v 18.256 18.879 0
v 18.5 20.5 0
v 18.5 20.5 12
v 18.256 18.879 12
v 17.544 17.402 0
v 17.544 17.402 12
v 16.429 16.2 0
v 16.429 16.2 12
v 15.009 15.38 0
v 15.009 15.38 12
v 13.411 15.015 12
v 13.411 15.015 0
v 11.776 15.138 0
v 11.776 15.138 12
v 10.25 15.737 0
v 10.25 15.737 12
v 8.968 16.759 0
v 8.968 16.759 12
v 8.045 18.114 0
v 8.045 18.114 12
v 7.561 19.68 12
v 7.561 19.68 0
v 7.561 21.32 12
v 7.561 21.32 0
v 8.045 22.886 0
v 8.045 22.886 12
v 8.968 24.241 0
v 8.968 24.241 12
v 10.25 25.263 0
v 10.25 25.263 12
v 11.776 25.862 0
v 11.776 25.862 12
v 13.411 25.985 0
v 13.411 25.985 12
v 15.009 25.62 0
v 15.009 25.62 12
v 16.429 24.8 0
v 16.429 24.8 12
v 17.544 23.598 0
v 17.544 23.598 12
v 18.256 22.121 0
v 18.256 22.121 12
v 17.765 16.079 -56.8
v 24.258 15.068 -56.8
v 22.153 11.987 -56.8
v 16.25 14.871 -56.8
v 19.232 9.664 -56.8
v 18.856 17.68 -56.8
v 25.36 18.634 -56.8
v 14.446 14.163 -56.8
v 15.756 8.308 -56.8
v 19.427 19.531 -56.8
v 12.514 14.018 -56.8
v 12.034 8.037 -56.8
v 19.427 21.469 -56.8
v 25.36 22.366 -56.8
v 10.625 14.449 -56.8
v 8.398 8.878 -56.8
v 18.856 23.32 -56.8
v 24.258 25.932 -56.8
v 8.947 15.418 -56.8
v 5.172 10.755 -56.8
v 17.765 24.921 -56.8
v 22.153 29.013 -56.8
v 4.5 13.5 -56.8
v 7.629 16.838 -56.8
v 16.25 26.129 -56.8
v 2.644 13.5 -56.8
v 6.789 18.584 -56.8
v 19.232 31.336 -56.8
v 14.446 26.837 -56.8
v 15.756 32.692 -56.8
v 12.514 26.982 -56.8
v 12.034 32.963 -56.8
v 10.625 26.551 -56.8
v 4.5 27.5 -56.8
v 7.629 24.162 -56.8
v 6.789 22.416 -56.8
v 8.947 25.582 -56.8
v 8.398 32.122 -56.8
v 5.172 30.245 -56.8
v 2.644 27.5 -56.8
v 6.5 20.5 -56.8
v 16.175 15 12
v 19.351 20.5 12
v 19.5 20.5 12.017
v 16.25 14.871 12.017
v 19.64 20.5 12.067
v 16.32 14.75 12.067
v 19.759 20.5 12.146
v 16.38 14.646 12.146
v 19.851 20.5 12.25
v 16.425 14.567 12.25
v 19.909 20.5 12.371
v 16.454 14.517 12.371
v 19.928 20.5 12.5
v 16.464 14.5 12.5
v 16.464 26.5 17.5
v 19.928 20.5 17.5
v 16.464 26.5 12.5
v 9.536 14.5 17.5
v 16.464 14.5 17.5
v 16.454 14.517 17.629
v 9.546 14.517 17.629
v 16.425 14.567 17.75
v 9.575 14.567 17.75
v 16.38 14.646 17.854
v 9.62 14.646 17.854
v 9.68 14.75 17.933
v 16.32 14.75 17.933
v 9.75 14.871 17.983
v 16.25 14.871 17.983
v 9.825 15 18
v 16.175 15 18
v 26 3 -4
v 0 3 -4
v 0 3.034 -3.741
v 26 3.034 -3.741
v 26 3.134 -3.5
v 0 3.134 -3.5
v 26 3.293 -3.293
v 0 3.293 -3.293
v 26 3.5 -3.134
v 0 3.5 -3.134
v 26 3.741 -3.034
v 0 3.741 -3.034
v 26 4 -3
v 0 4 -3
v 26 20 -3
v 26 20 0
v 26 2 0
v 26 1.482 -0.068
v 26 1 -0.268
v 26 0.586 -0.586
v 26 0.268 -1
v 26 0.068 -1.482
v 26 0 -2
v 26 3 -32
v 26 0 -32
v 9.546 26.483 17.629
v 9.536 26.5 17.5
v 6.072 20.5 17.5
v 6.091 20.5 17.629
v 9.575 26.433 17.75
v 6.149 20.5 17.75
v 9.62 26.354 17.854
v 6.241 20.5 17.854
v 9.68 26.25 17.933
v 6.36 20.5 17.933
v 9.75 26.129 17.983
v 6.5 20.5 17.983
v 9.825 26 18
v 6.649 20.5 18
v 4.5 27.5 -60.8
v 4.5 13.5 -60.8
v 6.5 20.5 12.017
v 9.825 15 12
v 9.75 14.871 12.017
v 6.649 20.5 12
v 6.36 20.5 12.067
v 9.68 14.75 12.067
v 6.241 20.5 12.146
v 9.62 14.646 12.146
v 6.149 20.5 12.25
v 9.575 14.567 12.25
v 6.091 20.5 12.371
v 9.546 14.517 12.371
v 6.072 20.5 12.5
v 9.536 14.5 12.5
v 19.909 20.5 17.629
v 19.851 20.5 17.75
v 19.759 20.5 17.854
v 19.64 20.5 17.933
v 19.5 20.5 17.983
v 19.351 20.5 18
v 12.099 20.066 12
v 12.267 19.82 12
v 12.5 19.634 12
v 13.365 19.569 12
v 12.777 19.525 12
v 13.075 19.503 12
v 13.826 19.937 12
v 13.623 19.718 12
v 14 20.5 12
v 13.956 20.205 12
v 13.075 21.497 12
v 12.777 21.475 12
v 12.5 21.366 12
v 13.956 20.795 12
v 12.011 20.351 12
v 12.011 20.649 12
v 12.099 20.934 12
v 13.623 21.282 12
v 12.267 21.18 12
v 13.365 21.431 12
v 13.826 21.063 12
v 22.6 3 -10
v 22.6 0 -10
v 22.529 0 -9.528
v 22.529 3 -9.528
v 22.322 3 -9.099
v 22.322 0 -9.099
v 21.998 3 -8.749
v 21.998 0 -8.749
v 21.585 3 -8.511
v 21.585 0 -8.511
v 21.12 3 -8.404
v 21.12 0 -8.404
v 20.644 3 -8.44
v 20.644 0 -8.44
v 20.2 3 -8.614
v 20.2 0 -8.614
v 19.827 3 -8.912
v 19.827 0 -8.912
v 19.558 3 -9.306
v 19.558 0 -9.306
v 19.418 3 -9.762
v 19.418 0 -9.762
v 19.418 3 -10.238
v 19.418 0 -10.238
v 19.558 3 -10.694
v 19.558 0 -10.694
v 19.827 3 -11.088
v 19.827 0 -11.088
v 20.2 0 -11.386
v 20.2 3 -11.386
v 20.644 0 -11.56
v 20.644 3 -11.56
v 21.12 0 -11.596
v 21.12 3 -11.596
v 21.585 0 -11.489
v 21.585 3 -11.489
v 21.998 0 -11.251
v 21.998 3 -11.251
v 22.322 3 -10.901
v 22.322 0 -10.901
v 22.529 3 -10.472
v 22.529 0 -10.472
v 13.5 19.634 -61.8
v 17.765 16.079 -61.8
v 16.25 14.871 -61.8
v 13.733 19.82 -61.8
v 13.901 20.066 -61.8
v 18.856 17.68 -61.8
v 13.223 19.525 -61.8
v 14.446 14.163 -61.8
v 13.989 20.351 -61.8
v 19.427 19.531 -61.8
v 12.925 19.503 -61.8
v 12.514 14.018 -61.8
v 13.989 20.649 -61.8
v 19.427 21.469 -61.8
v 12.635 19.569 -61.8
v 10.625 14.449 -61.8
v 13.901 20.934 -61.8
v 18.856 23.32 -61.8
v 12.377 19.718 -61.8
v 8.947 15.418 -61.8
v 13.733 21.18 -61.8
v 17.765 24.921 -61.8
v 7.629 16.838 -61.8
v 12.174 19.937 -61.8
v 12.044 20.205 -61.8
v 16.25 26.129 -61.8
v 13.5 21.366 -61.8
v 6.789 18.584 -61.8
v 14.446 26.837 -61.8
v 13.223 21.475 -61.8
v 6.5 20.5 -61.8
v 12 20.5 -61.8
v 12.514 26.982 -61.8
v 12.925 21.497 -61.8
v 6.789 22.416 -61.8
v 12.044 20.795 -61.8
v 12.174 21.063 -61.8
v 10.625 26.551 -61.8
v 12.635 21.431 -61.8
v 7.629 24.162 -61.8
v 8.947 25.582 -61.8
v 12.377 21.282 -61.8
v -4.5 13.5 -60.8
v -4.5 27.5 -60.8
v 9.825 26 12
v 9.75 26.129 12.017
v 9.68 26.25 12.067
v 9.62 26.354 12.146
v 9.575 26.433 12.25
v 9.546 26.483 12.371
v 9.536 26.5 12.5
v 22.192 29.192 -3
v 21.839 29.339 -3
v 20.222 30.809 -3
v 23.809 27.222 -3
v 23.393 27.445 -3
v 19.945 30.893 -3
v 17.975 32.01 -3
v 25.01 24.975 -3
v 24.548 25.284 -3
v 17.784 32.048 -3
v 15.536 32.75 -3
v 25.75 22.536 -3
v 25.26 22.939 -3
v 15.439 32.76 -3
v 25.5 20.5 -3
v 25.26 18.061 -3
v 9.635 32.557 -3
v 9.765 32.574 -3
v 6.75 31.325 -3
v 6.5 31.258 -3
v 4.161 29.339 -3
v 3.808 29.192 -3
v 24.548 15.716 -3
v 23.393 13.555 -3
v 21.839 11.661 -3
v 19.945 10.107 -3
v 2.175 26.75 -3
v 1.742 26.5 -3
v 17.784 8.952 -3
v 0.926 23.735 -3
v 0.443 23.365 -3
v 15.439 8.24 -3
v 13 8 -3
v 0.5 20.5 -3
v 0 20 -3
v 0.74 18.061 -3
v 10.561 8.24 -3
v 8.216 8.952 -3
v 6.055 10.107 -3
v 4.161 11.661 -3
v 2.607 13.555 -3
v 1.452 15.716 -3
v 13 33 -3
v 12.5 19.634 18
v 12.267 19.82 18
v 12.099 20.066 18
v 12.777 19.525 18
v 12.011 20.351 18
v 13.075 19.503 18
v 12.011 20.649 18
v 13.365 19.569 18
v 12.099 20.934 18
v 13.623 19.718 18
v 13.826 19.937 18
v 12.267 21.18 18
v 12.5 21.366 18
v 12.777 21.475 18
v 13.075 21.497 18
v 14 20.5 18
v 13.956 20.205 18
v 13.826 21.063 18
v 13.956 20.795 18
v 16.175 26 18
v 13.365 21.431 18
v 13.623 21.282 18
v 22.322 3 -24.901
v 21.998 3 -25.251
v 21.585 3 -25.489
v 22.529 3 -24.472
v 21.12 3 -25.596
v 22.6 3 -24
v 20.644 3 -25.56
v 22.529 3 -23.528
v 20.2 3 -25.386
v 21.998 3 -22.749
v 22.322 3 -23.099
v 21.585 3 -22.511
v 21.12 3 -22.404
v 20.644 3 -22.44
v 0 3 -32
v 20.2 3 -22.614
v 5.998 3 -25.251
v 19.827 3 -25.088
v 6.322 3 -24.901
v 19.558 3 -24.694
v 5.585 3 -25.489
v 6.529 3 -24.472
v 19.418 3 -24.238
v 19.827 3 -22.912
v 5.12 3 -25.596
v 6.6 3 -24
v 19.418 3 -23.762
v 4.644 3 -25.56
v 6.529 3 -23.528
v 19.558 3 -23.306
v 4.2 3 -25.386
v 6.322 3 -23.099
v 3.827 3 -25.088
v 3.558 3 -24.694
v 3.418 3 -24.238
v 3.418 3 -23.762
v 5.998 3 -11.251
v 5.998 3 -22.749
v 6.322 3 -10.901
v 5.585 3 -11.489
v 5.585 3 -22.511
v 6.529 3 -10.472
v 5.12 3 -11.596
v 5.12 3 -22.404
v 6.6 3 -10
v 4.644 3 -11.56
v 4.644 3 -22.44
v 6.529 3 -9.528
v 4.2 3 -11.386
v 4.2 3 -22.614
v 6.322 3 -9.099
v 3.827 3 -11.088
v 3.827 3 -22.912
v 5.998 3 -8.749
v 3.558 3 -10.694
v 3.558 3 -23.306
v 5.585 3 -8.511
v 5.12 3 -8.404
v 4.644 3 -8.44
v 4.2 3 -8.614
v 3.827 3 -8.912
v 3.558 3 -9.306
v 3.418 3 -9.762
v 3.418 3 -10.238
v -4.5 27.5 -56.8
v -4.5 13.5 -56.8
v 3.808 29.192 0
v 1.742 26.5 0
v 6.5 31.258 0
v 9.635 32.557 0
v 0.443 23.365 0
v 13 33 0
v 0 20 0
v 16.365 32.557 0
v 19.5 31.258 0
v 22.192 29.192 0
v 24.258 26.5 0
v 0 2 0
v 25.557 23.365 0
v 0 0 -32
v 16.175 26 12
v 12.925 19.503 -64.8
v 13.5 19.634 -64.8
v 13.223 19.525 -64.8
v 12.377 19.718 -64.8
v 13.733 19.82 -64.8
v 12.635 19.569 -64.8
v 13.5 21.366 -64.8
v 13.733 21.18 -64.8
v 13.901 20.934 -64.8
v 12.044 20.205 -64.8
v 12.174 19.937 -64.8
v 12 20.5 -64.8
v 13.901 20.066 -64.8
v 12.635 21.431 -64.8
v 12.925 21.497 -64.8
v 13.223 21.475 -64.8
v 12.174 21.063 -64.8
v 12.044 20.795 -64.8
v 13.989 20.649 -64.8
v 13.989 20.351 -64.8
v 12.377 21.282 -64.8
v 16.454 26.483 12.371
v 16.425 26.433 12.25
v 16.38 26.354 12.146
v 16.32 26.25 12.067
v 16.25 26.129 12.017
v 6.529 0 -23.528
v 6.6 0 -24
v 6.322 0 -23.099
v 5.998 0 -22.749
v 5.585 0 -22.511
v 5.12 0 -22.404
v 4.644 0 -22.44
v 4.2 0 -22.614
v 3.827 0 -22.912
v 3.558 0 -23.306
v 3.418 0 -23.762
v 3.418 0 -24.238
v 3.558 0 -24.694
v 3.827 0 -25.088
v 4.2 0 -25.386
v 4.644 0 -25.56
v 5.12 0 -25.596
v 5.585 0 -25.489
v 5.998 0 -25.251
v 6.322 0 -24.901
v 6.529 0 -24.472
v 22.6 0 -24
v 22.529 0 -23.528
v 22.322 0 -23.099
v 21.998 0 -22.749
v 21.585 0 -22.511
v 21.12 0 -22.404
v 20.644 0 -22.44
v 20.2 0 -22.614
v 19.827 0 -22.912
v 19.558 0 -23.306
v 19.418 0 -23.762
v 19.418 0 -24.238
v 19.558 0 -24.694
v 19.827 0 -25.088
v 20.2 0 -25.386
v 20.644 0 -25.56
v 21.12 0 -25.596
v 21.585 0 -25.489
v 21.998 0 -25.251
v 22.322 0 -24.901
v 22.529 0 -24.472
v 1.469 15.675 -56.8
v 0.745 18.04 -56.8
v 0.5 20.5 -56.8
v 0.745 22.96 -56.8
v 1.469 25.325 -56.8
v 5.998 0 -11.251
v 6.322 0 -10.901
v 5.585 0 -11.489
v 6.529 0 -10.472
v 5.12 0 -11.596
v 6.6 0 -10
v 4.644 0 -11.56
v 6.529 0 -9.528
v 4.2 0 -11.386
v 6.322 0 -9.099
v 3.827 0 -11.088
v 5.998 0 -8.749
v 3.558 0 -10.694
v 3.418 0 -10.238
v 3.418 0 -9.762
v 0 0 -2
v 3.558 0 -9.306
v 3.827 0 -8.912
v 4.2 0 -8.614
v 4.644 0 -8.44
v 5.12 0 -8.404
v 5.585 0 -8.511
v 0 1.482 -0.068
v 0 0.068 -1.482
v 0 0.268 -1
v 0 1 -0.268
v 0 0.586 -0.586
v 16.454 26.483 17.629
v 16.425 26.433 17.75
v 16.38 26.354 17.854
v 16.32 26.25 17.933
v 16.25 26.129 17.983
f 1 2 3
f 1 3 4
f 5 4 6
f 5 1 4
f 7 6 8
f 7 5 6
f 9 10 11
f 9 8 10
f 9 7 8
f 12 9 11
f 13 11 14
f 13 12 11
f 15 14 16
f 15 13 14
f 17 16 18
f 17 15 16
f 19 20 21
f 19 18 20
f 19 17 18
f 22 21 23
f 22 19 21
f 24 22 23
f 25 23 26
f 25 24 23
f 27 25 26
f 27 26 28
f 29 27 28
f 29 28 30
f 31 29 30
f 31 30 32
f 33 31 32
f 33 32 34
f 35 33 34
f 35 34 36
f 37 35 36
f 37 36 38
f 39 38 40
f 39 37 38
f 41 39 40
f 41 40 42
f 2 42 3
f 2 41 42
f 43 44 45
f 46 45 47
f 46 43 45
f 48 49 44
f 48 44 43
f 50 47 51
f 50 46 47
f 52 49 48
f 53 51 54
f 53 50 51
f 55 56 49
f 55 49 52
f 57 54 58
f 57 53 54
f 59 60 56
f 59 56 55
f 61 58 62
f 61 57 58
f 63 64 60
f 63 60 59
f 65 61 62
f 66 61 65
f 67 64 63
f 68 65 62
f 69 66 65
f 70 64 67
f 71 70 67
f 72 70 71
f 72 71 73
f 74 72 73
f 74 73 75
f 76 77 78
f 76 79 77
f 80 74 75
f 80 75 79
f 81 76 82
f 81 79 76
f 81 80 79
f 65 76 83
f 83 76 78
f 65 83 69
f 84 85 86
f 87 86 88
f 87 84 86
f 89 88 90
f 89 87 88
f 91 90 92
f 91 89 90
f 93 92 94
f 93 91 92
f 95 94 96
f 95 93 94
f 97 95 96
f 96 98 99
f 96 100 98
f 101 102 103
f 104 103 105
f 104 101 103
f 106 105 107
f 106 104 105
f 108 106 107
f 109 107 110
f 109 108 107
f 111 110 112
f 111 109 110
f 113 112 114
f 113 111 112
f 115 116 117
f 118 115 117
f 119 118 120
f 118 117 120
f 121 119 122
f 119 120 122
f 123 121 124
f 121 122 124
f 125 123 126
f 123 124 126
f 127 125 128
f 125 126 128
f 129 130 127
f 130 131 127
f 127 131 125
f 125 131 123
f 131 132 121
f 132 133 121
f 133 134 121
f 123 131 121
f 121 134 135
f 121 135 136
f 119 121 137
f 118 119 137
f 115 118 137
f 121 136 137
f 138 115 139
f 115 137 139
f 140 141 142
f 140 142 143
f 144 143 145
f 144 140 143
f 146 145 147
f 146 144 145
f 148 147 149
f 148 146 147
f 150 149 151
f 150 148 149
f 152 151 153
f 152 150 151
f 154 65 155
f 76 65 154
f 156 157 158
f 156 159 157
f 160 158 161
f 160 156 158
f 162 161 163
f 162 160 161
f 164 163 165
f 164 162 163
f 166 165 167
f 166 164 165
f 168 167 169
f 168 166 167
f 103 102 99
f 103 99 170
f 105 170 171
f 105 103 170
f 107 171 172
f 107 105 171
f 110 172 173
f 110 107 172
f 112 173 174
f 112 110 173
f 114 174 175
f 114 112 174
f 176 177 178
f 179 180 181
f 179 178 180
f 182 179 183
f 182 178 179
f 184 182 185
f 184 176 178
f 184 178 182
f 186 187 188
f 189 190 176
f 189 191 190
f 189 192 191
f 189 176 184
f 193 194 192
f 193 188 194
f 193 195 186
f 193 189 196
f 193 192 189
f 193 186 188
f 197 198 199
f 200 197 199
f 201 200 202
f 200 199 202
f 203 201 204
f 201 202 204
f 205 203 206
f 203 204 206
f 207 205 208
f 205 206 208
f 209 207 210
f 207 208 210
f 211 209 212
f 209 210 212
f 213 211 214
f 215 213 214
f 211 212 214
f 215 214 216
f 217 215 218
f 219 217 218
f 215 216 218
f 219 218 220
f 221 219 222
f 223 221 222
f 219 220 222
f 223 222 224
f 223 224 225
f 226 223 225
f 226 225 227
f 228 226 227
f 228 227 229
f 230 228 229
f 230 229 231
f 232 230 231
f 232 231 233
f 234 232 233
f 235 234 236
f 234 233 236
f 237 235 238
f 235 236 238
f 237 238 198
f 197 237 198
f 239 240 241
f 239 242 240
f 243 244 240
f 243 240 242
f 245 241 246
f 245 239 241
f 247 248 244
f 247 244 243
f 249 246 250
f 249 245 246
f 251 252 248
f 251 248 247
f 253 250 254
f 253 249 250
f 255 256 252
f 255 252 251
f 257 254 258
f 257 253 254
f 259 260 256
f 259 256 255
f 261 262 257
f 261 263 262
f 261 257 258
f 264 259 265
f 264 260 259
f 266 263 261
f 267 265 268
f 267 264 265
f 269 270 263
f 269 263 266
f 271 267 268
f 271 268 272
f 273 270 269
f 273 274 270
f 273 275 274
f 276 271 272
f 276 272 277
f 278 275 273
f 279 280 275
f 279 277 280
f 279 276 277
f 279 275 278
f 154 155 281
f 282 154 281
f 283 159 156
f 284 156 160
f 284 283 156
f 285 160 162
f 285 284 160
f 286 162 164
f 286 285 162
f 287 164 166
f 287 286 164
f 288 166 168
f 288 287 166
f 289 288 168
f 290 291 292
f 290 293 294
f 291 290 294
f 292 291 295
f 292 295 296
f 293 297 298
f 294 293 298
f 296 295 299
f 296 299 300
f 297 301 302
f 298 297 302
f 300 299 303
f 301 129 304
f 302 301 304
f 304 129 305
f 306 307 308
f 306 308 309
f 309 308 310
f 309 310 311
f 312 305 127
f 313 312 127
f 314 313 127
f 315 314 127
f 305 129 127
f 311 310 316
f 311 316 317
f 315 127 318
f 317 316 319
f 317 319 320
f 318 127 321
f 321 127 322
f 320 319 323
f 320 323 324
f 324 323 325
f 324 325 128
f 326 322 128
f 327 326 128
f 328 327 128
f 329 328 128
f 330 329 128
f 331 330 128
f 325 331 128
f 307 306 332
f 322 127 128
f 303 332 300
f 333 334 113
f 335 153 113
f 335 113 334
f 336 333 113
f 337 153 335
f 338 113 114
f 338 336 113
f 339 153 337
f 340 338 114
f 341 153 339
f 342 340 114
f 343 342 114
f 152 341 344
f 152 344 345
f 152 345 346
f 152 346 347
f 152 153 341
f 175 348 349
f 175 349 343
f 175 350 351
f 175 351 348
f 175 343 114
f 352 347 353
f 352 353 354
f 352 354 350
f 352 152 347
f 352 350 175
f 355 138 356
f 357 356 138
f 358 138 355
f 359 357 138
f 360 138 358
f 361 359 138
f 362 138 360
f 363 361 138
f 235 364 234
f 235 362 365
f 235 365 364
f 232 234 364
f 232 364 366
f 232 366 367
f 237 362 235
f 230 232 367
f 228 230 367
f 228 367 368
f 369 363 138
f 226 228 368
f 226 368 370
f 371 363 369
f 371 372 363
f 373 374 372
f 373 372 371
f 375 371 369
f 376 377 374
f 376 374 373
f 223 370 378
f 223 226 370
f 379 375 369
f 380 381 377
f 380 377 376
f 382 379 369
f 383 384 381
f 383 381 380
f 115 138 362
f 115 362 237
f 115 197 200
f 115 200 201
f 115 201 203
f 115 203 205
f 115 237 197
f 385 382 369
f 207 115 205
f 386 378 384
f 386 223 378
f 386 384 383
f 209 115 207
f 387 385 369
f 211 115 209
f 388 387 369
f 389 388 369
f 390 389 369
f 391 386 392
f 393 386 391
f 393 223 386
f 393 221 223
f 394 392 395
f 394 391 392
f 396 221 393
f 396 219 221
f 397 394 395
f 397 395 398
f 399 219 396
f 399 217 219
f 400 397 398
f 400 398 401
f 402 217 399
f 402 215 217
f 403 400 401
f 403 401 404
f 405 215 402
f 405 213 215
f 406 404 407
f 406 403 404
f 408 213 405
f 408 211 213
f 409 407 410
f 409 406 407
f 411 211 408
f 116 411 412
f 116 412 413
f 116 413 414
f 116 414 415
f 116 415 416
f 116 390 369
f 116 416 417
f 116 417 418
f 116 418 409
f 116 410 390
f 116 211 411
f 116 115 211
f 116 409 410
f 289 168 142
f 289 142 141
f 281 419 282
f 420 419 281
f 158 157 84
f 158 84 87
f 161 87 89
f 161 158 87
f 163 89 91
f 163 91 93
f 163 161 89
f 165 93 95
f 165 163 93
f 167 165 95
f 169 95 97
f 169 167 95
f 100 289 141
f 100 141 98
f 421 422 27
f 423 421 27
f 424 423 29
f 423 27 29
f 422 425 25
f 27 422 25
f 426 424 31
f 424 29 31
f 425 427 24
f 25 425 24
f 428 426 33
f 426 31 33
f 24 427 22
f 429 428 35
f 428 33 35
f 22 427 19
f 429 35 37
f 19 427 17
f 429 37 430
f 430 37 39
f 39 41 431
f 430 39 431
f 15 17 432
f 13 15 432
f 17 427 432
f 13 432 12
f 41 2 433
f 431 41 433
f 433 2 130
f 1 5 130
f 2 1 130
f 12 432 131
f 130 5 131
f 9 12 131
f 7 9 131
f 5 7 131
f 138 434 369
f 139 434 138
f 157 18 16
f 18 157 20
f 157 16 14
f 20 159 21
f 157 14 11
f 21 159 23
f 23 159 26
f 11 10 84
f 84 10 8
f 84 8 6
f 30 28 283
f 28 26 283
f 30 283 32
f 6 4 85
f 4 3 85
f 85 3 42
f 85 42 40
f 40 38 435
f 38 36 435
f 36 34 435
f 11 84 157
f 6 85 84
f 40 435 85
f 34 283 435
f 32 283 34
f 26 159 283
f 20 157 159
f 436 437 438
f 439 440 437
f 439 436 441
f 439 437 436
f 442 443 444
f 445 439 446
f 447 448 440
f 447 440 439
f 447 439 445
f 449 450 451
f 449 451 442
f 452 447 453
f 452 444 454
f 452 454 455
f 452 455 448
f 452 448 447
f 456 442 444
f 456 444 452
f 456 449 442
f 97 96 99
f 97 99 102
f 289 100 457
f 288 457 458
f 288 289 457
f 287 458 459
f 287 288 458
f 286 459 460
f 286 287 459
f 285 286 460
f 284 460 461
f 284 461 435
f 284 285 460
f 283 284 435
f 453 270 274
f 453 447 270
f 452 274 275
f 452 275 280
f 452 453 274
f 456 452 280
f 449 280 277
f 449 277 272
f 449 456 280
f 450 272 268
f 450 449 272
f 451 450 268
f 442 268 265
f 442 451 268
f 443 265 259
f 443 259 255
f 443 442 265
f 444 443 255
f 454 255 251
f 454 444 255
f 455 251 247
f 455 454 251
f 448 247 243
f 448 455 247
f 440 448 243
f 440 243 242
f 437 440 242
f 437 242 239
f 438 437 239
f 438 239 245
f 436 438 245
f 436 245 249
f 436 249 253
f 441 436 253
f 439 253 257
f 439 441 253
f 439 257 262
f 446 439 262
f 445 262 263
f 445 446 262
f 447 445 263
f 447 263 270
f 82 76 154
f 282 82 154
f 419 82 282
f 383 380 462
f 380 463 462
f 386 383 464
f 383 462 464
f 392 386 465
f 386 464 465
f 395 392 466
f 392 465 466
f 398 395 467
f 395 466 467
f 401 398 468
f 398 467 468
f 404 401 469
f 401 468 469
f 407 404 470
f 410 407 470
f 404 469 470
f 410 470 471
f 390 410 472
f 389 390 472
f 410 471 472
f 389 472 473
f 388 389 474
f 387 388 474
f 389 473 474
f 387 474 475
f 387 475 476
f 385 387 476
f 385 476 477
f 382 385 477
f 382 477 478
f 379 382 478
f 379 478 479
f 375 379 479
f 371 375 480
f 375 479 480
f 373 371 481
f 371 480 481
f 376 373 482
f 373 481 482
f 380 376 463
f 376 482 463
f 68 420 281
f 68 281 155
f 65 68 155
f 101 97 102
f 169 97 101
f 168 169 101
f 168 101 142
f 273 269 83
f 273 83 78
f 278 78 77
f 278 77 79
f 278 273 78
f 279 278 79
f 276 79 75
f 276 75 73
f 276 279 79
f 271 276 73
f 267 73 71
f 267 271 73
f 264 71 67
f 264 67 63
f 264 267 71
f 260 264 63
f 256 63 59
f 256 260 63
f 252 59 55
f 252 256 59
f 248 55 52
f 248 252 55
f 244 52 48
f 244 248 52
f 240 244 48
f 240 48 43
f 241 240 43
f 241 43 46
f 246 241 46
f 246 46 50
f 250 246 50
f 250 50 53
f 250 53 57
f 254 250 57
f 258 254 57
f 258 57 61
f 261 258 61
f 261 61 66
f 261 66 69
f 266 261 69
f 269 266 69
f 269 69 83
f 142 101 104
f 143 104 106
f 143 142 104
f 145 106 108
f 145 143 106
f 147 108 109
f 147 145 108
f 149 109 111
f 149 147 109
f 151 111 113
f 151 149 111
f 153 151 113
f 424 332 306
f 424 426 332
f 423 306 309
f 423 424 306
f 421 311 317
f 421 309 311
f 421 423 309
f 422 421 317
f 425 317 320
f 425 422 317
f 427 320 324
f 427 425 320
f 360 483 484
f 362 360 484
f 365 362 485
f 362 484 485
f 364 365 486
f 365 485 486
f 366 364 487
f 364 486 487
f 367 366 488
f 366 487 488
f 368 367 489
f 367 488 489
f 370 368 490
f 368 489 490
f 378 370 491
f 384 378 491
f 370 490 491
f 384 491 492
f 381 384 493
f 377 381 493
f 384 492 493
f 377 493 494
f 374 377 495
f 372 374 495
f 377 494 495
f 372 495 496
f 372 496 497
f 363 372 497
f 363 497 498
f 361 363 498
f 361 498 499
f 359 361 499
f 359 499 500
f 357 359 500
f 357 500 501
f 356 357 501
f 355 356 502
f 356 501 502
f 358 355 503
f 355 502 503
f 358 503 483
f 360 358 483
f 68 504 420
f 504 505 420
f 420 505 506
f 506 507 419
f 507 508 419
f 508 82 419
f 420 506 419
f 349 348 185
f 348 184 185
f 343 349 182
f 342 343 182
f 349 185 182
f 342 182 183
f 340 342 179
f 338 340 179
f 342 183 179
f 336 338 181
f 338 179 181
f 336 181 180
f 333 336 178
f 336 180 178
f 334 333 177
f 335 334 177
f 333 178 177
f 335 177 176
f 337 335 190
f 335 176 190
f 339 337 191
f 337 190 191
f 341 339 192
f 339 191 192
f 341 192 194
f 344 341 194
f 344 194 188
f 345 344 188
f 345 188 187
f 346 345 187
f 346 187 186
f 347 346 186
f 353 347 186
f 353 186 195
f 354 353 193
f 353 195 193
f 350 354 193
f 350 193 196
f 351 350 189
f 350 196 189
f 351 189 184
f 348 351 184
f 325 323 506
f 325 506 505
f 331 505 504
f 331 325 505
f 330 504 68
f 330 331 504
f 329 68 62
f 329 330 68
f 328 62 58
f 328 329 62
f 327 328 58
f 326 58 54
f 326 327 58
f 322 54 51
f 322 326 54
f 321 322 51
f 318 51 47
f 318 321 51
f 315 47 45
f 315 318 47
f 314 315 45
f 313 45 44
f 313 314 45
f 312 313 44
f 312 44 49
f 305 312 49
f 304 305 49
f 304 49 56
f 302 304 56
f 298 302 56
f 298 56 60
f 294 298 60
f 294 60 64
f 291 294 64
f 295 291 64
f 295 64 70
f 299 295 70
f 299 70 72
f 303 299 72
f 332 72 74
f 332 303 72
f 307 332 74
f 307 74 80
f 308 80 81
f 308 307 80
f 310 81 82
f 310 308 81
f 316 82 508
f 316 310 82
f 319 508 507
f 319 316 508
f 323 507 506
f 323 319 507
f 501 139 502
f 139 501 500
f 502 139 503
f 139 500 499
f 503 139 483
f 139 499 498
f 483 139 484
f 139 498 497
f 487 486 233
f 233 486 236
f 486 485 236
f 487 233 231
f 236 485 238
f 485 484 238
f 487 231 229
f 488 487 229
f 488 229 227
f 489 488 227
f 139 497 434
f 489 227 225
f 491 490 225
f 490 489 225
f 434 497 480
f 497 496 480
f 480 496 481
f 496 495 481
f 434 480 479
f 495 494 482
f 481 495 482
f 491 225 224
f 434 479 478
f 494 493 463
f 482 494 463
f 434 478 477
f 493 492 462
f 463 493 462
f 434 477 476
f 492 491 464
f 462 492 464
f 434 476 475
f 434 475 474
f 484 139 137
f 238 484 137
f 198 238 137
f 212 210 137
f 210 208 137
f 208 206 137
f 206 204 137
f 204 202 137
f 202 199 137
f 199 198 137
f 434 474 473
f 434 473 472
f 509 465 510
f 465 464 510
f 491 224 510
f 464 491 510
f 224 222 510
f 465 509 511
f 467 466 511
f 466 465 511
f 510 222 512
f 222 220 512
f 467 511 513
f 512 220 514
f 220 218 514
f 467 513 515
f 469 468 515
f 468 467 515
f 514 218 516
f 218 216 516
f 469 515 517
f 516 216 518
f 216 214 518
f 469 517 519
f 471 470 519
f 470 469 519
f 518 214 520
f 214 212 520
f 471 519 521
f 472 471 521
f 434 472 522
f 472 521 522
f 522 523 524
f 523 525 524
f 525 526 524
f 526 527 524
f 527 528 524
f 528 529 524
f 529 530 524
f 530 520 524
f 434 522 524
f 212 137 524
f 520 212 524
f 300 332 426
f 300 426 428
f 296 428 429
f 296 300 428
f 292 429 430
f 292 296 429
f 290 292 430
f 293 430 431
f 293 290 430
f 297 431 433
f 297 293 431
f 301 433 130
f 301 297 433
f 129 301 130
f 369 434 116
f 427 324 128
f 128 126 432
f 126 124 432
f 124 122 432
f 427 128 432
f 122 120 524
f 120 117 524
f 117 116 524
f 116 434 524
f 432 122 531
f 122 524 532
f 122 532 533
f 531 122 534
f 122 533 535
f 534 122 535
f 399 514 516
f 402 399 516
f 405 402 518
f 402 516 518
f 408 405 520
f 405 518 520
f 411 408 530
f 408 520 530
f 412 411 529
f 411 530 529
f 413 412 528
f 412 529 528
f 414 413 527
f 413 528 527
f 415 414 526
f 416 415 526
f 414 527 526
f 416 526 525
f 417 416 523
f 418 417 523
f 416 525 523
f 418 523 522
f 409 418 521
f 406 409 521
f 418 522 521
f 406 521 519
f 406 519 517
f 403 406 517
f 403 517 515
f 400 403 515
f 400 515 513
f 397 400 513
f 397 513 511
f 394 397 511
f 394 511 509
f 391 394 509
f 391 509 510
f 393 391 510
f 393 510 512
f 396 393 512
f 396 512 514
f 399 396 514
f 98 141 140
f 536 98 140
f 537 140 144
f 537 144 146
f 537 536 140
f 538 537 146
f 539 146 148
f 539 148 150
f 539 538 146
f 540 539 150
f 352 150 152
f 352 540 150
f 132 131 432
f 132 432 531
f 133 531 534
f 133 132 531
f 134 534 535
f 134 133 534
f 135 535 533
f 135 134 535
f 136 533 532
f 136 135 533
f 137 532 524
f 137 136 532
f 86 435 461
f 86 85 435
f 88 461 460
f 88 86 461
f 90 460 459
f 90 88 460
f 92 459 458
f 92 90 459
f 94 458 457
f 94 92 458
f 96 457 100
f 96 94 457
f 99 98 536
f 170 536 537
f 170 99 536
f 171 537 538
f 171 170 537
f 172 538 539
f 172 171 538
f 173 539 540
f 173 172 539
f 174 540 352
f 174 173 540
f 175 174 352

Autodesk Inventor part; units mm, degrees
ref_plane "YZ Plane" through (0, 0, 0) normal (1, 0, 0) x (0, 1, 0)
ref_plane "XZ Plane" through (0, 0, 0) normal (0, 1, 0) x (-1, 0, 0)
ref_plane "XY Plane" through (0, 0, 0) normal (0, 0, 1) x (1, 0, 0)
sketch "Эскиз1" plane through (0, 0, 0) normal (0, 1, 0) x (-1, 0, 0)
  line L0 (0, 0) -> (-26, 0)
  line L1 (0, -32) -> (-26, -32)
  line L2 (-26, -32) -> (0, -32)
  line L3 (0, -32) -> (0, 0)
  line L4 (0, 0) -> (-26, 0)
  line L5 (-26, 0) -> (-26, -32)
extrude "Выдавливание1" add sketch "Эскиз1" along normal blind 3
sketch "Эскиз2" plane through (0, 3, 0) normal (0, 1, 0) x (1, 0, 0)
  line L0 (0, 0) -> (26, 0) projected
  line L1 (26, 0) -> (26, 33) projected
  line L2 (0, 0) -> (26, 0)
  line L3 (26, 0) -> (26, 3)
  line L4 (26, 3) -> (0, 3)
  line L5 (0, 3) -> (0, 0)
  dimension "d4" = 3
extrude "Выдавливание2" add sketch "Эскиз2" along normal blind 30
sketch "Эскиз3" plane through (26, 3, -3) normal (0, 0, -1) x (-1, 0, 0)
  line L0 (0, 0) -> (26, 0) projected
  line L1 (13, 0) -> (13, 5)
  line L2 (13, 5) -> (13, 17.5)
  circle A0 centre (13, 17.5) radius 12.5
  point P0 (26, -3)
  dimension "d7" = 5
  dimension "d8" = 12.5
extrude "Выдавливание3" add sketch "Эскиз3" along normal blind 61.8
sketch "Эскиз4" plane through (13, 20.5, -64.8) normal (0, 0, -1) x (-1, 0, 0)
  circle A0 centre (0, 0) radius 6.5
  circle A1 centre (0, 0) radius 12.5
  point P0 (13, -20.5)
  dimension "d11" = 13
extrude "Выдавливание4" cut sketch "Эскиз4" against normal blind 8
sketch "Эскиз5" plane through (13, 20.5, -64.8) normal (0, 0, -1) x (-1, 0, 0)
  circle A0 centre (0, 0) radius 1
  circle A1 centre (0, 0) radius 6.5
  point P0 (13, -20.5)
  dimension "d14" = 2
extrude "Выдавливание5" cut sketch "Эскиз5" against normal blind 3
sketch "Эскиз6" plane through (13, 20.5, -56.8) normal (0, 0, -1) x (-1, 0, 0)
  circle A0 centre (0, 0) radius 12.5 projected
  line L0 (-12.5, 0) -> (8.5, 0)
  line L1 (8.5, 0) -> (8.5, 7)
  line L2 (8.5, 7) -> (17.5, 7)
  line L3 (17.5, 7) -> (17.5, -7)
  line L4 (17.5, -7) -> (8.5, -7)
  line L5 (8.5, -7) -> (8.5, 0)
  point P0 (13, -20.5)
  dimension "d17" = 21
  dimension "d18" = 7
  dimension "d19" = 9
  dimension "d20" = 14
extrude "Выдавливание6" add sketch "Эскиз6" along normal blind 4 contours A0 L4 L5 L1 L2 | A0 L2 L3 L4
sketch "Эскиз7" plane through (0, 0, 0) normal (0, 0, 1) x (1, 0, 0)
  circle A0 centre (13, 20.5) radius 1 projected
  circle A1 centre (13, 20.5) radius 5.5
  point P0 (0, 0)
  dimension "d23" = 11
extrude "Выдавливание7" add sketch "Эскиз7" along normal blind 12 contours A0 | A1
sketch "Эскиз8" plane through (13, 20.5, 12) normal (0, 0, 1) x (1, 0, 0)
  line L0 (0, 0) -> (0, 6)
  circle A0 centre (0, 0) radius 1 projected
  line L1 (3.4641, 6) -> (6.9282, 0)
  line L2 (6.9282, 0) -> (3.4641, -6)
  line L3 (3.4641, -6) -> (-3.4641, -6)
  line L4 (-3.4641, -6) -> (-6.9282, 0)
  line L5 (-6.9282, 0) -> (-3.4641, 6)
  line L6 (-3.4641, 6) -> (3.4641, 6)
  point P0 (-13, -20.5)
  dimension "d26" = 6
extrude "Выдавливание8" add sketch "Эскиз8" along normal blind 6
fillet "Сопряжение1" radius 0.5 12 edges at (7.8038, 23.5, 12) (13, 26.5, 12) (7.8038, 17.5, 12) (13, 14.5, 12) (18.1962, 17.5, 12) (18.1962, 23.5, 12) (13, 14.5, 18) (18.1962, 17.5, 18) (18.1962, 23.5, 18) (13, 26.5, 18) (7.8038, 23.5, 18) (7.8038, 17.5, 18)
sketch "Эскиз9" plane through (0, 0, 0) normal (0, -1, 0) x (1, 0, 0)
  line L0 (26, 0) -> (26, -33) projected
  line L1 (0, 0) -> (26, 0) projected
  line L2 (5, -10) -> (21, -10)
  line L3 (21, -10) -> (21, -24)
  line L4 (21, -24) -> (5, -24)
  line L5 (5, -24) -> (5, -10)
  circle A0 centre (5, -10) radius 1.6
  circle A1 centre (21, -10) radius 1.6
  circle A2 centre (21, -24) radius 1.6
  circle A3 centre (5, -24) radius 1.6
  dimension "d45" = 16
  dimension "d46" = 14
  dimension "d47" = 3.2
  dimension "d48" = 3.2
  dimension "d49" = 3.2
  dimension "d50" = 3.2
extrude "Выдавливание9" cut sketch "Эскиз9" against normal blind 3 contours L5 A0 L2 | L2 A0 L5 | A1 L3 L2 | L2 L3 A1 | A3 L4 L5 | L5 L4 A3 | A2 L4 L3 | L3 L4 A2
fillet "Сопряжение2" radius 2 1 edges at (13, 0, 0)
fillet "Сопряжение3" radius 1 1 edges at (13, 3, -3)
fillet "Сопряжение4" radius 13 2 edges at (0, 33, -1.5) (26, 33, -1.5)
properties part number "motor"
